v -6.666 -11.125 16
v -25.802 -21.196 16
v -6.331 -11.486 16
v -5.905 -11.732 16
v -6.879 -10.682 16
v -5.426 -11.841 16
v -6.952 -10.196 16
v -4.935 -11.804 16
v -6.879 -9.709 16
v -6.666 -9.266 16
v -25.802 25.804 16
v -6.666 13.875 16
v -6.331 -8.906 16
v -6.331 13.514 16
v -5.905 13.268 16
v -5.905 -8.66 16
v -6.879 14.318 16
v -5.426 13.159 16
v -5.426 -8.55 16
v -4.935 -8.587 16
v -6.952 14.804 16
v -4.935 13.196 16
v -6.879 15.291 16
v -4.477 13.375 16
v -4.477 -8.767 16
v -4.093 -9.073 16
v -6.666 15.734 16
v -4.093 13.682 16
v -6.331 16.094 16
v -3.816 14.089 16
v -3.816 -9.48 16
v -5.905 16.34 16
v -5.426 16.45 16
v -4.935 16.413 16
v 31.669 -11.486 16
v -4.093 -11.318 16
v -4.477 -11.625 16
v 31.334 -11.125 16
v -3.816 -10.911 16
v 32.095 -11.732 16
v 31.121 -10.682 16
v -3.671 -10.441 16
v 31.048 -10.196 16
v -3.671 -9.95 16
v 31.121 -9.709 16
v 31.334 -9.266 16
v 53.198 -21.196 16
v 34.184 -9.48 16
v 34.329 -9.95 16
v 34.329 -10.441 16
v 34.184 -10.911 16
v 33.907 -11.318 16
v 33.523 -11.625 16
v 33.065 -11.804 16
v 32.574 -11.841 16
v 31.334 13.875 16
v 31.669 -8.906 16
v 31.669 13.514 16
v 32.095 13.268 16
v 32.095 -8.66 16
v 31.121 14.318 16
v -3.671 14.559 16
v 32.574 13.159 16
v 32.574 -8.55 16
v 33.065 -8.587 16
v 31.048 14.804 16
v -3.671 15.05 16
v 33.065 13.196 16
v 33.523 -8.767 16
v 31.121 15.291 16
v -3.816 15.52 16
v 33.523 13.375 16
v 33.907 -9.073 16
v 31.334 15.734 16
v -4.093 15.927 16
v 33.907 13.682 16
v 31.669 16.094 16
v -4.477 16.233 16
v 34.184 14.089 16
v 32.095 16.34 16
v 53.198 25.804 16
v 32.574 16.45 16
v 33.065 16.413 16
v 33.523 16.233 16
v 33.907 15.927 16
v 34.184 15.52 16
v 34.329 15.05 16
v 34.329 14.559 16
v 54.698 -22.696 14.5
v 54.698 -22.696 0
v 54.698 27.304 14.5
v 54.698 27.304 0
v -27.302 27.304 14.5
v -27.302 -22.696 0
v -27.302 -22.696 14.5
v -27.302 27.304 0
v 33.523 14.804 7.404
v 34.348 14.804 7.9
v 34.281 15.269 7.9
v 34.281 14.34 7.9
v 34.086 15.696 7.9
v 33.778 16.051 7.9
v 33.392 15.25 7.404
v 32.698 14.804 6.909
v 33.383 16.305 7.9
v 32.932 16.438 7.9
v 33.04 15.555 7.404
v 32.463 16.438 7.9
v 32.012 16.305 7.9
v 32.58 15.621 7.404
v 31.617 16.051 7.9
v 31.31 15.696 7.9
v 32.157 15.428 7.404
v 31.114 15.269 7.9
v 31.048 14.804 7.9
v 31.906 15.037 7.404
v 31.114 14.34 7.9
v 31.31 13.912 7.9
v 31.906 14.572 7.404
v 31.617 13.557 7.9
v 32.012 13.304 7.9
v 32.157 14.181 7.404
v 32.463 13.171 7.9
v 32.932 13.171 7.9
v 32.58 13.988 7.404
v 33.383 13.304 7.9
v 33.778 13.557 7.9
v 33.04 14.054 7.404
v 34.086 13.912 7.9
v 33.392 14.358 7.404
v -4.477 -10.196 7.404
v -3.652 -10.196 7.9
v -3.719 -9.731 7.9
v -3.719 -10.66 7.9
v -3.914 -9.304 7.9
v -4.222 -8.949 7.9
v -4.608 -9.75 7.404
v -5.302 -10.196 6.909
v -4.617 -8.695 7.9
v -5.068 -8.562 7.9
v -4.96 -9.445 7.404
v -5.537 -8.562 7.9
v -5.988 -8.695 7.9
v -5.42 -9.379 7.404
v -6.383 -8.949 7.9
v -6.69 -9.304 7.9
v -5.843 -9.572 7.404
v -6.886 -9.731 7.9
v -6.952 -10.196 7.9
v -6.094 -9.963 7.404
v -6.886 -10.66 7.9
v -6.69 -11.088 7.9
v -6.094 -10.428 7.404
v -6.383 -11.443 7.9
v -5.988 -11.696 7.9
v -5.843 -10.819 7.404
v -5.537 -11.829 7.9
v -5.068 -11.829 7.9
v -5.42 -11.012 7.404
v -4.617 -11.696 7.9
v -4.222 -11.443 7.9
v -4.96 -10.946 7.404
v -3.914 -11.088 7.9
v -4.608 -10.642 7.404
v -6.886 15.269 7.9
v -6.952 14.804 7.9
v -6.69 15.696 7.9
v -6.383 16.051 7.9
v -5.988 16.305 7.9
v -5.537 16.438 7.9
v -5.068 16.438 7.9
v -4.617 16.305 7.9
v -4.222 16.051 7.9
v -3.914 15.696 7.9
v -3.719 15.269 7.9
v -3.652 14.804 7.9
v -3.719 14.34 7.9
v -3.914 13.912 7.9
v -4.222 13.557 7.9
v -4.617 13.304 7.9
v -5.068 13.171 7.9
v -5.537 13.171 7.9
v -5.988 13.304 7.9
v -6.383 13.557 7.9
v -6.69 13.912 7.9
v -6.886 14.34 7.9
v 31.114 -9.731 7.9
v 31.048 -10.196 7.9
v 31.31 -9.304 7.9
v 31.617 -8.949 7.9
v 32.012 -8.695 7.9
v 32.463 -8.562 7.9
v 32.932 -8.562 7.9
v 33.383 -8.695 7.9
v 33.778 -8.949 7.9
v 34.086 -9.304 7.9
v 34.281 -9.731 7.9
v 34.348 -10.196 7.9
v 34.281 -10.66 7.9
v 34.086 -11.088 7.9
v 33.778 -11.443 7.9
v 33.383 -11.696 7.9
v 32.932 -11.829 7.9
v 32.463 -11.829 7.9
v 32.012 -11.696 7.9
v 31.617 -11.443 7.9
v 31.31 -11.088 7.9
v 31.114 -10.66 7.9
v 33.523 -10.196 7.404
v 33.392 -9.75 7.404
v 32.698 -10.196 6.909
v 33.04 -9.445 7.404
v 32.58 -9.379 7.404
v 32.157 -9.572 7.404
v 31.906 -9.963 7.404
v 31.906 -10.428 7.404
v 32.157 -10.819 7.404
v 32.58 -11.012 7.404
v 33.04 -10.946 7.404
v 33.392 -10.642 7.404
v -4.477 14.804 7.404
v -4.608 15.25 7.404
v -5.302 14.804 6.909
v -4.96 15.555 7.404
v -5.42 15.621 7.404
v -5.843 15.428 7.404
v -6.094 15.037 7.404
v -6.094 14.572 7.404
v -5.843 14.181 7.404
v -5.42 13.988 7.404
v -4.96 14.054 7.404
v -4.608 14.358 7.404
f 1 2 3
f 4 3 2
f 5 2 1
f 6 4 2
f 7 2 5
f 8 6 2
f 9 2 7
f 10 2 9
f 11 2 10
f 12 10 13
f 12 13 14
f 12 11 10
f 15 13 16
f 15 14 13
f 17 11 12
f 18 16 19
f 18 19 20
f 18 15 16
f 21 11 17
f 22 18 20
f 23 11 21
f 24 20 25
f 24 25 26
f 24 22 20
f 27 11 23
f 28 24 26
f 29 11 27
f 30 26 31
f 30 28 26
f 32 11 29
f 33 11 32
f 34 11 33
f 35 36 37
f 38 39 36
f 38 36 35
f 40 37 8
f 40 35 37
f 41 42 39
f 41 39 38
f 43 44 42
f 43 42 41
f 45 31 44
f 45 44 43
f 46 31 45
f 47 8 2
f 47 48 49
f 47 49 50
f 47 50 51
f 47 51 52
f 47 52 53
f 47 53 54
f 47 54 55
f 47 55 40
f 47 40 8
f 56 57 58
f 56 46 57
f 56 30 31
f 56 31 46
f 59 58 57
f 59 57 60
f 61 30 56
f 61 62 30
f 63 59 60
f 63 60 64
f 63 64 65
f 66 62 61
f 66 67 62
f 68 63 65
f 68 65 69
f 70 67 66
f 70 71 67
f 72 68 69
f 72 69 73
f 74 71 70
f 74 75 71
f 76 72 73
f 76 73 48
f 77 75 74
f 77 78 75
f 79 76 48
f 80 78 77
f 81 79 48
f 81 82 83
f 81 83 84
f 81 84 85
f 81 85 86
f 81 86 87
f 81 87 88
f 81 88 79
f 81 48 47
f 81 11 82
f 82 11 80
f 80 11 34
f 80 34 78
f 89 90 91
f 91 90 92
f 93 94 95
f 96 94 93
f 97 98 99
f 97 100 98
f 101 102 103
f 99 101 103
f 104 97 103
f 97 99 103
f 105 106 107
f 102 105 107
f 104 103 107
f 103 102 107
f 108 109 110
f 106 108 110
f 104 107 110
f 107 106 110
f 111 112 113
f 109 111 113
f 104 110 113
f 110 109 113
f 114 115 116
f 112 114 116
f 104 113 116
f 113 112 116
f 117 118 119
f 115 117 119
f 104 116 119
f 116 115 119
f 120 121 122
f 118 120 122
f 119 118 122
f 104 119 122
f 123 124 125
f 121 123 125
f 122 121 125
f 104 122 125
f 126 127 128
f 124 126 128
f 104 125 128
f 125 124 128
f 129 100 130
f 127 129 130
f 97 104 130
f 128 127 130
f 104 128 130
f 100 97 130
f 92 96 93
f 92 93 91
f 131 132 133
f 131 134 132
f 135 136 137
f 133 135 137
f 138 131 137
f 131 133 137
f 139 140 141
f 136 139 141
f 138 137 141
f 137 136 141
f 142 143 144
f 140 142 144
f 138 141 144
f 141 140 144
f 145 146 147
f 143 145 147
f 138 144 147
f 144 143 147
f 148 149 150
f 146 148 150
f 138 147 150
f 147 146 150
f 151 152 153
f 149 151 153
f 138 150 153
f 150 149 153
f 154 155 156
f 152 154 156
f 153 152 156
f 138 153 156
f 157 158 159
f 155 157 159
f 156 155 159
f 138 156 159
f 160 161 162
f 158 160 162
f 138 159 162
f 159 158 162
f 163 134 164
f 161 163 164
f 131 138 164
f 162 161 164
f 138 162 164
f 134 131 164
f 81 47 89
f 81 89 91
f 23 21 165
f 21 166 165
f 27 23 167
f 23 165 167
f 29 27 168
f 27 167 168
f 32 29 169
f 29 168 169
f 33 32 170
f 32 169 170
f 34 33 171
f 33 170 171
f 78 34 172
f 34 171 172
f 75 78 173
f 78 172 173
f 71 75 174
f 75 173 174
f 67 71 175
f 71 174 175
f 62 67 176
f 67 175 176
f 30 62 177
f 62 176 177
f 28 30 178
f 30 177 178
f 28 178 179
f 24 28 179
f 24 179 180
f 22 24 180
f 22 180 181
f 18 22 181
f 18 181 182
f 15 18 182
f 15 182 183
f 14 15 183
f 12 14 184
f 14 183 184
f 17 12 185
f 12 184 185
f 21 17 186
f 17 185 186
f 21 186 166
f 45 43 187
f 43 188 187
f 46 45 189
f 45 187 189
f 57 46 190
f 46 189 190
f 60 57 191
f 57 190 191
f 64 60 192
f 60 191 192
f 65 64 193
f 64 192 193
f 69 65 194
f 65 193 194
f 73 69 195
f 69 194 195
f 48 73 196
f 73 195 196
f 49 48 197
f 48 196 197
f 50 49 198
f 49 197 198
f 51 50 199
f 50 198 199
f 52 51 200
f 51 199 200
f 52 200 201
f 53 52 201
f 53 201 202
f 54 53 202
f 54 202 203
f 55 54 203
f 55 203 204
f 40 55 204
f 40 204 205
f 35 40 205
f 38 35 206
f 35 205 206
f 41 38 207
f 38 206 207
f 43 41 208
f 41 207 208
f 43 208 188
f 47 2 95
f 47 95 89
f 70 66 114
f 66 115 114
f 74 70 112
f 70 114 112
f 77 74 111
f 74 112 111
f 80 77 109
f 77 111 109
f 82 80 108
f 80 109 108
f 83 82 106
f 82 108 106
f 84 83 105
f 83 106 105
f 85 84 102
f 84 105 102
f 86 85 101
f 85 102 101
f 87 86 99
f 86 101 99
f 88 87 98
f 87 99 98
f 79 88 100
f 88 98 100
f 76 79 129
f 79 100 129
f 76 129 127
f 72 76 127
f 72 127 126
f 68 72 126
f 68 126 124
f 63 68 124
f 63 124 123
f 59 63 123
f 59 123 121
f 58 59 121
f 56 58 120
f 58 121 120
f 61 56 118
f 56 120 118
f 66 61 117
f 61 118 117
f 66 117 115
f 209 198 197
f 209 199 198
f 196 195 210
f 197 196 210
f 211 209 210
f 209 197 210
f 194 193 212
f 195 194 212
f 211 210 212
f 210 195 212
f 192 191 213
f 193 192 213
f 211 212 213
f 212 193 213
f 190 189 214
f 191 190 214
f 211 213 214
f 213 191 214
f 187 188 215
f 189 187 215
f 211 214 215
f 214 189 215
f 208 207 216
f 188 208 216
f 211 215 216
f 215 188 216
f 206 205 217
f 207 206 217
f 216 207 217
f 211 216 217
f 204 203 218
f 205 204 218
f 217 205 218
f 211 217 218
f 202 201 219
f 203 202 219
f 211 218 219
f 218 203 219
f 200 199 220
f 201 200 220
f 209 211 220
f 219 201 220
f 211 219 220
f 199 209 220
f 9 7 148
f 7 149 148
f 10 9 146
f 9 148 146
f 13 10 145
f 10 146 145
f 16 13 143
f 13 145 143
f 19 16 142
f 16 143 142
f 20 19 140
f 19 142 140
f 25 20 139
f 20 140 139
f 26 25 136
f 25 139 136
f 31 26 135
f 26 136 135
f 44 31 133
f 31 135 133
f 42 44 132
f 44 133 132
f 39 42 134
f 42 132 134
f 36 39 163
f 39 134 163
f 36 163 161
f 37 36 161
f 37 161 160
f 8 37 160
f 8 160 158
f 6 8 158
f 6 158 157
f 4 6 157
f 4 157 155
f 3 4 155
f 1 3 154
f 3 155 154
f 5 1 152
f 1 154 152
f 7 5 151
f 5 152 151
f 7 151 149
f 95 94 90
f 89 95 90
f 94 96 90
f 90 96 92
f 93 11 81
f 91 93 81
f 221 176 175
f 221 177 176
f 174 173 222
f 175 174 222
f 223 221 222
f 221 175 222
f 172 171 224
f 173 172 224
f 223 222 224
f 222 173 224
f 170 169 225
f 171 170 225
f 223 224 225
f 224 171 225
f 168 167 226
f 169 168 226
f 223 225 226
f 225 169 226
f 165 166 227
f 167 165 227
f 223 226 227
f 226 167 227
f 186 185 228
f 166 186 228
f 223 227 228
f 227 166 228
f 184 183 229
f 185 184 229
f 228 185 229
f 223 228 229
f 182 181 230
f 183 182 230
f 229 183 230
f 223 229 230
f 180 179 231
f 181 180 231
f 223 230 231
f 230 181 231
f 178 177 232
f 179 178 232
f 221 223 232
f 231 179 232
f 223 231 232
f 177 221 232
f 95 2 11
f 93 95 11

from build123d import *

# Parameters (mm, degrees)
F0_W     = 82
F0_H     = 50
F1_DEPTH = 16
F2_SIZE  = 1.5
F4_D     = 3.3
F4_DEPTH = 8.1
F4_TIP   = 0.9914200214


with BuildPart() as f1:
    # F0 (on Top) → F1 (new body)
    with BuildSketch(Plane.XY):
        with Locations((13.6976632877, 2.3044347763)):
            Rectangle(F0_W, F0_H)
    extrude(amount=F1_DEPTH)

    # F2
    f2_edges = [f1.edges().sort_by_distance(p)[0] for p in [
        (13.697663, -22.695565, 16),
        (54.697663, 2.304435, 16),
        (13.697663, 27.304435, 16),
        (-27.302337, 2.304435, 16),
    ]]
    chamfer(f2_edges, length=F2_SIZE)

    # F4
    with Locations(Plane.XY.offset(16)):
        with Locations((-5.3023367123, 14.8044347763), (-5.3023367123, -10.1955652237), (32.6976632877, 14.8044347763), (32.6976632877, -10.1955652237)):
            Hole(F4_D / 2, depth=F4_DEPTH)
            with Locations((0, 0, -(F4_DEPTH + F4_TIP / 2))):  # 118° drill point
                Cone(0, F4_D / 2, F4_TIP, mode=Mode.SUBTRACT)


solid = f1.part
